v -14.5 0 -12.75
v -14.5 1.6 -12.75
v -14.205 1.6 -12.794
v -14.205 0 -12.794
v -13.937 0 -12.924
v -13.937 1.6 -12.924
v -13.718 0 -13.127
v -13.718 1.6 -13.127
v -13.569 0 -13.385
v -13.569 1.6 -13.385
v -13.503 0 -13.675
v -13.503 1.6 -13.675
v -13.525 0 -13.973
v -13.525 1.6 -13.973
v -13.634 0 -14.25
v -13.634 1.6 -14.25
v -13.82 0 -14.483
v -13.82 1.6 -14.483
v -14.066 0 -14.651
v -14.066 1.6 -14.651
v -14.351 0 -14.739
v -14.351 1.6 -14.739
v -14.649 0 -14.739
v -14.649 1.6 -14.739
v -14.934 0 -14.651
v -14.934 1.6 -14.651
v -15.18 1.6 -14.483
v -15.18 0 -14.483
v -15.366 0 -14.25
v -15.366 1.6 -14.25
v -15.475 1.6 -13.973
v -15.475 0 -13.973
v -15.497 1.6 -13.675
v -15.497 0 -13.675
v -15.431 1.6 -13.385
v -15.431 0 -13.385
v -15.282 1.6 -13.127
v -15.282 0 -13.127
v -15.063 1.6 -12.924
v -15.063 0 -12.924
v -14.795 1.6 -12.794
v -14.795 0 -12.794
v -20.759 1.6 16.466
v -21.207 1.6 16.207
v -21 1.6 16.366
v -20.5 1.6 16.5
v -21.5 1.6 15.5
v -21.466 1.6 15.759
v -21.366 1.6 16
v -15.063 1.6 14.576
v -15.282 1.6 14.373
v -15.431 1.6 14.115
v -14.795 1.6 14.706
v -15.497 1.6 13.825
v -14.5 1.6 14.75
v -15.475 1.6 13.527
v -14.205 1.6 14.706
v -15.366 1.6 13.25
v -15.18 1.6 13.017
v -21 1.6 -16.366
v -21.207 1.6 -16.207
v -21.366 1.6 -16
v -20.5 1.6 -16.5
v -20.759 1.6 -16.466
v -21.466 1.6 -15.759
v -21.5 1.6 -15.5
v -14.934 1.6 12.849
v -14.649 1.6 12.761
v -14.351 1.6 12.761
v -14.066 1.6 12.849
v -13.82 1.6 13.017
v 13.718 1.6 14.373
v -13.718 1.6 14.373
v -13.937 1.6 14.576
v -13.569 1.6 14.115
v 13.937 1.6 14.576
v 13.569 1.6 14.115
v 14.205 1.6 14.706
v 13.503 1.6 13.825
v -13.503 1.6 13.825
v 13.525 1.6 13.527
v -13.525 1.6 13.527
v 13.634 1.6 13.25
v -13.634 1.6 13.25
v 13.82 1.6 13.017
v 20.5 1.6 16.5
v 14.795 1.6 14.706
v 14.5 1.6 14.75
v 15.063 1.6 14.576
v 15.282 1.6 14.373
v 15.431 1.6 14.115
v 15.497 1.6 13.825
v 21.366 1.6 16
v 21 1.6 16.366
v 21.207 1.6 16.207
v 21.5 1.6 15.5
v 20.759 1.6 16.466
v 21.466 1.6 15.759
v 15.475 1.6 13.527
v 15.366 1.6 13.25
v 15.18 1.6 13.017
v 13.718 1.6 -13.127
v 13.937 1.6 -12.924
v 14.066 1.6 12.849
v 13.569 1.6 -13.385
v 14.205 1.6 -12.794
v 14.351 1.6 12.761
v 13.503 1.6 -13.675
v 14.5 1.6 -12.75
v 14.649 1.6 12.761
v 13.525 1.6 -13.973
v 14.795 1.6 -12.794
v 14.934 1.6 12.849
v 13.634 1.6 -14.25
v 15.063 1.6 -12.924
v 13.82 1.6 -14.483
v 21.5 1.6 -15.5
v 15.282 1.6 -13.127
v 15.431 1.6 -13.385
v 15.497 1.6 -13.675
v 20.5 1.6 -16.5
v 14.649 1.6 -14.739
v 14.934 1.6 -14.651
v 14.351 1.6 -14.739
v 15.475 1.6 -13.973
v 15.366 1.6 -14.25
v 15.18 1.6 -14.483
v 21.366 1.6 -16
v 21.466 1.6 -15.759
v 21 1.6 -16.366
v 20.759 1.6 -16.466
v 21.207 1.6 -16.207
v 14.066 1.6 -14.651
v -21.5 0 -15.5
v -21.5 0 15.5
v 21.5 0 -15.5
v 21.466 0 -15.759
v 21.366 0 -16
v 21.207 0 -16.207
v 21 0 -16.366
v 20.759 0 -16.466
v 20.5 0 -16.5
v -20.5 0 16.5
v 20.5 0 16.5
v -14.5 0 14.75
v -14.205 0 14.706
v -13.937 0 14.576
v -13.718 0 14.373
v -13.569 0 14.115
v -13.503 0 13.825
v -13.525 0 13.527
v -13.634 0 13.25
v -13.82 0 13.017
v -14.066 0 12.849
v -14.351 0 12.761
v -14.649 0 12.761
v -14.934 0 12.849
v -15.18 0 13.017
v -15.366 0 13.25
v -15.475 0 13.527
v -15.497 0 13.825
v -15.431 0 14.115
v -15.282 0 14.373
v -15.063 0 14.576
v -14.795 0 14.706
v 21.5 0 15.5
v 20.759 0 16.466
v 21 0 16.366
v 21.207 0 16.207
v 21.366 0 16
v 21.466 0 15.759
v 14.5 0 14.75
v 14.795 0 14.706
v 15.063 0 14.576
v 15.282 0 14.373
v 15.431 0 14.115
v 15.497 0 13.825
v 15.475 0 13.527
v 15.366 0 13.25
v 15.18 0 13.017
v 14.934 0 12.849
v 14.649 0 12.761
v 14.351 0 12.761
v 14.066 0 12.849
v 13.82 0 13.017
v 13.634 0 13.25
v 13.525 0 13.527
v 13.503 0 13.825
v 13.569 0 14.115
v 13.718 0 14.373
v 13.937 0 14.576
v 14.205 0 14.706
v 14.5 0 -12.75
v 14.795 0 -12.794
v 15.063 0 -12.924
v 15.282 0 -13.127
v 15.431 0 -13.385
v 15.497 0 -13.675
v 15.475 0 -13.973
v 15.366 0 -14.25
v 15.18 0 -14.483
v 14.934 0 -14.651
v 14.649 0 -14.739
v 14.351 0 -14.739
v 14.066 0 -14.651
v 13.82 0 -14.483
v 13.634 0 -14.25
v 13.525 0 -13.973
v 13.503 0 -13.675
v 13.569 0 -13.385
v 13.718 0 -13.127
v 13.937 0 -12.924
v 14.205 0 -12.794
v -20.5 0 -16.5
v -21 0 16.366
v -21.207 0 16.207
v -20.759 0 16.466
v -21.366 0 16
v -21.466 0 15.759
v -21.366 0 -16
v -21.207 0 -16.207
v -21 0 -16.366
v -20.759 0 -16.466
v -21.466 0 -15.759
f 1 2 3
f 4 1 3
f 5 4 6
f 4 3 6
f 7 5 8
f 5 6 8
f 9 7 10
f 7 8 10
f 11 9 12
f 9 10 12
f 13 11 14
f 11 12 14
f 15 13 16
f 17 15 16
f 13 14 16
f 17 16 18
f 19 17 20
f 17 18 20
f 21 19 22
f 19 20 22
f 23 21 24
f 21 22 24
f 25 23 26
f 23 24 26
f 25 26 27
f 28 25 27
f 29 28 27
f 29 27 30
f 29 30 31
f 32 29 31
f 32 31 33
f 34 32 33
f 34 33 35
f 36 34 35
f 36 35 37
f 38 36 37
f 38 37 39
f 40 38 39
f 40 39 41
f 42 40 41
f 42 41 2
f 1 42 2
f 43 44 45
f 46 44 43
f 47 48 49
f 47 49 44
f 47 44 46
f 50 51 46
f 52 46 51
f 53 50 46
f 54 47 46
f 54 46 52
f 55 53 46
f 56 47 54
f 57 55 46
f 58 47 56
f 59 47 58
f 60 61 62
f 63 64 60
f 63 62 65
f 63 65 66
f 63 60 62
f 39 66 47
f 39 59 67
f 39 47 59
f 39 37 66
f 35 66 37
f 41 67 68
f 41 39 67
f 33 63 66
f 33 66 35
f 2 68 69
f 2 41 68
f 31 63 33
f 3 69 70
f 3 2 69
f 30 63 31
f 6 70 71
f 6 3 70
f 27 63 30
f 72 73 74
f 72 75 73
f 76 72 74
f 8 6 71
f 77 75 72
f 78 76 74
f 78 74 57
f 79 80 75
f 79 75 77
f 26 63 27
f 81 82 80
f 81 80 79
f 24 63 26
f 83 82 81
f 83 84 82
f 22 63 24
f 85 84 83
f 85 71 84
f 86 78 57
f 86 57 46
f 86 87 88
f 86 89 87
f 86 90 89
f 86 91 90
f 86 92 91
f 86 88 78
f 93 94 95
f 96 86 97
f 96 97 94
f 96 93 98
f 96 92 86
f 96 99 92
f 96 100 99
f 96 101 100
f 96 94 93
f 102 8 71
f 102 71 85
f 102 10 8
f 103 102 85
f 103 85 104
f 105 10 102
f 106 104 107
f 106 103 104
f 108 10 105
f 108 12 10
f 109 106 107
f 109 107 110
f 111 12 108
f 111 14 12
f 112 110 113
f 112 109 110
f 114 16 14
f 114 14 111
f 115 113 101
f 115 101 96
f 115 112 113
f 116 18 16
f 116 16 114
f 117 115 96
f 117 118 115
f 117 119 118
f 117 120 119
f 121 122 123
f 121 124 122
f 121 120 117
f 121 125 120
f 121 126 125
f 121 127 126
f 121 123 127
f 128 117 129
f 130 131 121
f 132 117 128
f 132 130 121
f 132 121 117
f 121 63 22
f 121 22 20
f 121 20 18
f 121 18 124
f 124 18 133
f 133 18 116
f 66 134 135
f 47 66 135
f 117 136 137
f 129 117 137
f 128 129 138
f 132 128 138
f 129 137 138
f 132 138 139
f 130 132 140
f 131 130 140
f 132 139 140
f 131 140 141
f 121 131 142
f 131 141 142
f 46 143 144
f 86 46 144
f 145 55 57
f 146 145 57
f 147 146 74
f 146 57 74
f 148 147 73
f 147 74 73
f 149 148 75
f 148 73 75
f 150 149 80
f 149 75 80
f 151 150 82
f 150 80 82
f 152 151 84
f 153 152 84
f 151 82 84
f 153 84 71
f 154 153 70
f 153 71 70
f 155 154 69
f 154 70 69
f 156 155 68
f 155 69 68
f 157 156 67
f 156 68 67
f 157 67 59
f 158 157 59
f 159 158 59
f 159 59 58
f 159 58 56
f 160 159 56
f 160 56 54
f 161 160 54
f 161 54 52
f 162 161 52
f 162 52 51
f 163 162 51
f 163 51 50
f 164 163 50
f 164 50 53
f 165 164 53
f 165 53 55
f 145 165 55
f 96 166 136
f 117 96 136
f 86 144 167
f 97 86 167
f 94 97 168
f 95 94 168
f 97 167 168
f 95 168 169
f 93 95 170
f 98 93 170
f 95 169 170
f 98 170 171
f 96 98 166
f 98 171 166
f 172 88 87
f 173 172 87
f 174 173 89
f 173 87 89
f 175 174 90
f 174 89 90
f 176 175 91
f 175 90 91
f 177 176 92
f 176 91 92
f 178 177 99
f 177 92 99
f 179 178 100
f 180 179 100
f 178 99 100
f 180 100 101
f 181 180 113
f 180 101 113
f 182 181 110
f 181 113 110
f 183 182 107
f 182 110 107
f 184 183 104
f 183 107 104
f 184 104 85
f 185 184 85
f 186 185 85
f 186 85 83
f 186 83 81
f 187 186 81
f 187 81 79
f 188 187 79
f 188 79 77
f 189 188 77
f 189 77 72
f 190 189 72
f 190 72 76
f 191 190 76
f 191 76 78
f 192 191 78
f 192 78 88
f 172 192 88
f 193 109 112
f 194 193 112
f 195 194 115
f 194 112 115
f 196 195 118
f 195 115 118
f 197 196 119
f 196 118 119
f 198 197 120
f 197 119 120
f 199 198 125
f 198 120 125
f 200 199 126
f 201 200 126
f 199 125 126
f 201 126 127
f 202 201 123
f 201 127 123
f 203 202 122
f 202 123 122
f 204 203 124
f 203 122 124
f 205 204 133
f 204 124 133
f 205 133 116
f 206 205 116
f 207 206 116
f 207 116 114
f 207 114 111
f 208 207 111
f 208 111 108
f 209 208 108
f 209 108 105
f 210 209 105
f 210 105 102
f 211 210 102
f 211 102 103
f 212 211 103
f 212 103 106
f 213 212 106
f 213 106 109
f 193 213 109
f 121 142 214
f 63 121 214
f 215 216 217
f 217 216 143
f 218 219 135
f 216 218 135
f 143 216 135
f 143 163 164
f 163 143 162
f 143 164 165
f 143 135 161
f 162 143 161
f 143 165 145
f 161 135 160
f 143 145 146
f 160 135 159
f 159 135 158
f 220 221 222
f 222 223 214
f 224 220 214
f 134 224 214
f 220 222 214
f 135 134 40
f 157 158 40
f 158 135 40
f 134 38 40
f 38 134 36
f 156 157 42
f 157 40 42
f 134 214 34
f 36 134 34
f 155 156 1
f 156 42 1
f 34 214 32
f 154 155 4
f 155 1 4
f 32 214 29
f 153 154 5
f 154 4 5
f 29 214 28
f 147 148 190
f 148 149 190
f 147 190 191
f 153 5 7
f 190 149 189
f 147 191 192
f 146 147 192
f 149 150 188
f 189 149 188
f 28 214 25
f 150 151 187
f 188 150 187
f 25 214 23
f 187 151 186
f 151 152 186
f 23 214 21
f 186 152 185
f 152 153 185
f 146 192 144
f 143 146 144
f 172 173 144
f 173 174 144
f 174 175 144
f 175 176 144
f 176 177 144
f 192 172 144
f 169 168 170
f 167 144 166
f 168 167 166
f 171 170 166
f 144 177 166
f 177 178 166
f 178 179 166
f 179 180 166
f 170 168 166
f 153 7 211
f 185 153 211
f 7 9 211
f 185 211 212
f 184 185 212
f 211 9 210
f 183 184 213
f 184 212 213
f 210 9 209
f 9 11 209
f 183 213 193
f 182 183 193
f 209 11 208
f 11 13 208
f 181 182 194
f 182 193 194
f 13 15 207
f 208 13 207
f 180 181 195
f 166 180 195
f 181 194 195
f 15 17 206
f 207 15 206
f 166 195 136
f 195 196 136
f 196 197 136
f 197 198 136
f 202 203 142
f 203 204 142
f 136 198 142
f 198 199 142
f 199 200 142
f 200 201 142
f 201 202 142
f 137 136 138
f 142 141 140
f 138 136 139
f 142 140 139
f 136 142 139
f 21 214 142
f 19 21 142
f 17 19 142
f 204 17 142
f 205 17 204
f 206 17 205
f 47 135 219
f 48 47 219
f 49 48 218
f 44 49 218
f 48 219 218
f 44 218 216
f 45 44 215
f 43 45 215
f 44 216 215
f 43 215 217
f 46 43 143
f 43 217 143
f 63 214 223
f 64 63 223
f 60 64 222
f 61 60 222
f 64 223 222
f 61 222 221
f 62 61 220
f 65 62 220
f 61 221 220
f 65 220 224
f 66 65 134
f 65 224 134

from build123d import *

# Parameters (mm, degrees)
BOSS_EXTRU_1_DEPTH      = 1.6
ENL_V_MAT_EXTRU_1_REACH = 29.149
ESQUISSE2_R             = 1


with BuildPart() as part:
    # Esquisse1 → Boss.-Extru.1 (new body)
    with BuildSketch(Plane(origin=(0, 0, 0), x_dir=(1, 0, 0), z_dir=(0, 1, 0))):
        with BuildLine():
            Line((-20.5, -16.5), (20.5, -16.5))
            ThreePointArc((20.5, -16.5), (21.207106781, -16.207106781), (21.5, -15.5))
            Line((21.5, -15.5), (21.5, 15.5))
            ThreePointArc((21.5, 15.5), (21.207106781, 16.207106781), (20.5, 16.5))
            Line((20.5, 16.5), (-20.5, 16.5))
            ThreePointArc((-20.5, 16.5), (-21.207106781, 16.207106781), (-21.5, 15.5))
            Line((-21.5, 15.5), (-21.5, -15.5))
            ThreePointArc((-21.5, -15.5), (-21.207106781, -16.207106781), (-20.5, -16.5))
        make_face()
    extrude(amount=BOSS_EXTRU_1_DEPTH)

    # Esquisse2 → Enlèv. mat.-Extru.1 (cut, up to next)
    with BuildSketch(Plane(origin=(0, 1.6, 0), x_dir=(1, 0, 0), z_dir=(0, 1, 0)), mode=Mode.PRIVATE) as enl_v_mat_extru_1_sk1:
        with Locations(Location((-14.5, 13.75, 0), (0, 0, 270))):
            Circle(ESQUISSE2_R)
    enl_v_mat_extru_1_tool1 = extrude(enl_v_mat_extru_1_sk1.sketch, amount=-ENL_V_MAT_EXTRU_1_REACH, mode=Mode.PRIVATE) & part.part
    # Esquisse2 → Enlèv. mat.-Extru.1 (cut, up to next)
    with BuildSketch(Plane(origin=(0, 1.6, 0), x_dir=(1, 0, 0), z_dir=(0, 1, 0)), mode=Mode.PRIVATE) as enl_v_mat_extru_1_sk2:
        with Locations(Location((14.5, 13.75, 0), (0, 0, 270))):
            Circle(ESQUISSE2_R)
    enl_v_mat_extru_1_tool2 = extrude(enl_v_mat_extru_1_sk2.sketch, amount=-ENL_V_MAT_EXTRU_1_REACH, mode=Mode.PRIVATE) & part.part
    # Esquisse2 → Enlèv. mat.-Extru.1 (cut, up to next)
    with BuildSketch(Plane(origin=(0, 1.6, 0), x_dir=(1, 0, 0), z_dir=(0, 1, 0)), mode=Mode.PRIVATE) as enl_v_mat_extru_1_sk3:
        with Locations(Location((14.5, -13.75, 0), (0, 0, 270))):
            Circle(ESQUISSE2_R)
    enl_v_mat_extru_1_tool3 = extrude(enl_v_mat_extru_1_sk3.sketch, amount=-ENL_V_MAT_EXTRU_1_REACH, mode=Mode.PRIVATE) & part.part
    # Esquisse2 → Enlèv. mat.-Extru.1 (cut, up to next)
    with BuildSketch(Plane(origin=(0, 1.6, 0), x_dir=(1, 0, 0), z_dir=(0, 1, 0)), mode=Mode.PRIVATE) as enl_v_mat_extru_1_sk4:
        with Locations(Location((-14.5, -13.75, 0), (0, 0, 270))):
            Circle(ESQUISSE2_R)
    enl_v_mat_extru_1_tool4 = extrude(enl_v_mat_extru_1_sk4.sketch, amount=-ENL_V_MAT_EXTRU_1_REACH, mode=Mode.PRIVATE) & part.part
    add(enl_v_mat_extru_1_tool1.solids().sort_by_distance((-14.5, 1.6, -13.75))[0], mode=Mode.SUBTRACT)
    add(enl_v_mat_extru_1_tool2.solids().sort_by_distance((14.5, 1.6, -13.75))[0], mode=Mode.SUBTRACT)
    add(enl_v_mat_extru_1_tool3.solids().sort_by_distance((14.5, 1.6, 13.75))[0], mode=Mode.SUBTRACT)
    add(enl_v_mat_extru_1_tool4.solids().sort_by_distance((-14.5, 1.6, 13.75))[0], mode=Mode.SUBTRACT)


solid = part.part
